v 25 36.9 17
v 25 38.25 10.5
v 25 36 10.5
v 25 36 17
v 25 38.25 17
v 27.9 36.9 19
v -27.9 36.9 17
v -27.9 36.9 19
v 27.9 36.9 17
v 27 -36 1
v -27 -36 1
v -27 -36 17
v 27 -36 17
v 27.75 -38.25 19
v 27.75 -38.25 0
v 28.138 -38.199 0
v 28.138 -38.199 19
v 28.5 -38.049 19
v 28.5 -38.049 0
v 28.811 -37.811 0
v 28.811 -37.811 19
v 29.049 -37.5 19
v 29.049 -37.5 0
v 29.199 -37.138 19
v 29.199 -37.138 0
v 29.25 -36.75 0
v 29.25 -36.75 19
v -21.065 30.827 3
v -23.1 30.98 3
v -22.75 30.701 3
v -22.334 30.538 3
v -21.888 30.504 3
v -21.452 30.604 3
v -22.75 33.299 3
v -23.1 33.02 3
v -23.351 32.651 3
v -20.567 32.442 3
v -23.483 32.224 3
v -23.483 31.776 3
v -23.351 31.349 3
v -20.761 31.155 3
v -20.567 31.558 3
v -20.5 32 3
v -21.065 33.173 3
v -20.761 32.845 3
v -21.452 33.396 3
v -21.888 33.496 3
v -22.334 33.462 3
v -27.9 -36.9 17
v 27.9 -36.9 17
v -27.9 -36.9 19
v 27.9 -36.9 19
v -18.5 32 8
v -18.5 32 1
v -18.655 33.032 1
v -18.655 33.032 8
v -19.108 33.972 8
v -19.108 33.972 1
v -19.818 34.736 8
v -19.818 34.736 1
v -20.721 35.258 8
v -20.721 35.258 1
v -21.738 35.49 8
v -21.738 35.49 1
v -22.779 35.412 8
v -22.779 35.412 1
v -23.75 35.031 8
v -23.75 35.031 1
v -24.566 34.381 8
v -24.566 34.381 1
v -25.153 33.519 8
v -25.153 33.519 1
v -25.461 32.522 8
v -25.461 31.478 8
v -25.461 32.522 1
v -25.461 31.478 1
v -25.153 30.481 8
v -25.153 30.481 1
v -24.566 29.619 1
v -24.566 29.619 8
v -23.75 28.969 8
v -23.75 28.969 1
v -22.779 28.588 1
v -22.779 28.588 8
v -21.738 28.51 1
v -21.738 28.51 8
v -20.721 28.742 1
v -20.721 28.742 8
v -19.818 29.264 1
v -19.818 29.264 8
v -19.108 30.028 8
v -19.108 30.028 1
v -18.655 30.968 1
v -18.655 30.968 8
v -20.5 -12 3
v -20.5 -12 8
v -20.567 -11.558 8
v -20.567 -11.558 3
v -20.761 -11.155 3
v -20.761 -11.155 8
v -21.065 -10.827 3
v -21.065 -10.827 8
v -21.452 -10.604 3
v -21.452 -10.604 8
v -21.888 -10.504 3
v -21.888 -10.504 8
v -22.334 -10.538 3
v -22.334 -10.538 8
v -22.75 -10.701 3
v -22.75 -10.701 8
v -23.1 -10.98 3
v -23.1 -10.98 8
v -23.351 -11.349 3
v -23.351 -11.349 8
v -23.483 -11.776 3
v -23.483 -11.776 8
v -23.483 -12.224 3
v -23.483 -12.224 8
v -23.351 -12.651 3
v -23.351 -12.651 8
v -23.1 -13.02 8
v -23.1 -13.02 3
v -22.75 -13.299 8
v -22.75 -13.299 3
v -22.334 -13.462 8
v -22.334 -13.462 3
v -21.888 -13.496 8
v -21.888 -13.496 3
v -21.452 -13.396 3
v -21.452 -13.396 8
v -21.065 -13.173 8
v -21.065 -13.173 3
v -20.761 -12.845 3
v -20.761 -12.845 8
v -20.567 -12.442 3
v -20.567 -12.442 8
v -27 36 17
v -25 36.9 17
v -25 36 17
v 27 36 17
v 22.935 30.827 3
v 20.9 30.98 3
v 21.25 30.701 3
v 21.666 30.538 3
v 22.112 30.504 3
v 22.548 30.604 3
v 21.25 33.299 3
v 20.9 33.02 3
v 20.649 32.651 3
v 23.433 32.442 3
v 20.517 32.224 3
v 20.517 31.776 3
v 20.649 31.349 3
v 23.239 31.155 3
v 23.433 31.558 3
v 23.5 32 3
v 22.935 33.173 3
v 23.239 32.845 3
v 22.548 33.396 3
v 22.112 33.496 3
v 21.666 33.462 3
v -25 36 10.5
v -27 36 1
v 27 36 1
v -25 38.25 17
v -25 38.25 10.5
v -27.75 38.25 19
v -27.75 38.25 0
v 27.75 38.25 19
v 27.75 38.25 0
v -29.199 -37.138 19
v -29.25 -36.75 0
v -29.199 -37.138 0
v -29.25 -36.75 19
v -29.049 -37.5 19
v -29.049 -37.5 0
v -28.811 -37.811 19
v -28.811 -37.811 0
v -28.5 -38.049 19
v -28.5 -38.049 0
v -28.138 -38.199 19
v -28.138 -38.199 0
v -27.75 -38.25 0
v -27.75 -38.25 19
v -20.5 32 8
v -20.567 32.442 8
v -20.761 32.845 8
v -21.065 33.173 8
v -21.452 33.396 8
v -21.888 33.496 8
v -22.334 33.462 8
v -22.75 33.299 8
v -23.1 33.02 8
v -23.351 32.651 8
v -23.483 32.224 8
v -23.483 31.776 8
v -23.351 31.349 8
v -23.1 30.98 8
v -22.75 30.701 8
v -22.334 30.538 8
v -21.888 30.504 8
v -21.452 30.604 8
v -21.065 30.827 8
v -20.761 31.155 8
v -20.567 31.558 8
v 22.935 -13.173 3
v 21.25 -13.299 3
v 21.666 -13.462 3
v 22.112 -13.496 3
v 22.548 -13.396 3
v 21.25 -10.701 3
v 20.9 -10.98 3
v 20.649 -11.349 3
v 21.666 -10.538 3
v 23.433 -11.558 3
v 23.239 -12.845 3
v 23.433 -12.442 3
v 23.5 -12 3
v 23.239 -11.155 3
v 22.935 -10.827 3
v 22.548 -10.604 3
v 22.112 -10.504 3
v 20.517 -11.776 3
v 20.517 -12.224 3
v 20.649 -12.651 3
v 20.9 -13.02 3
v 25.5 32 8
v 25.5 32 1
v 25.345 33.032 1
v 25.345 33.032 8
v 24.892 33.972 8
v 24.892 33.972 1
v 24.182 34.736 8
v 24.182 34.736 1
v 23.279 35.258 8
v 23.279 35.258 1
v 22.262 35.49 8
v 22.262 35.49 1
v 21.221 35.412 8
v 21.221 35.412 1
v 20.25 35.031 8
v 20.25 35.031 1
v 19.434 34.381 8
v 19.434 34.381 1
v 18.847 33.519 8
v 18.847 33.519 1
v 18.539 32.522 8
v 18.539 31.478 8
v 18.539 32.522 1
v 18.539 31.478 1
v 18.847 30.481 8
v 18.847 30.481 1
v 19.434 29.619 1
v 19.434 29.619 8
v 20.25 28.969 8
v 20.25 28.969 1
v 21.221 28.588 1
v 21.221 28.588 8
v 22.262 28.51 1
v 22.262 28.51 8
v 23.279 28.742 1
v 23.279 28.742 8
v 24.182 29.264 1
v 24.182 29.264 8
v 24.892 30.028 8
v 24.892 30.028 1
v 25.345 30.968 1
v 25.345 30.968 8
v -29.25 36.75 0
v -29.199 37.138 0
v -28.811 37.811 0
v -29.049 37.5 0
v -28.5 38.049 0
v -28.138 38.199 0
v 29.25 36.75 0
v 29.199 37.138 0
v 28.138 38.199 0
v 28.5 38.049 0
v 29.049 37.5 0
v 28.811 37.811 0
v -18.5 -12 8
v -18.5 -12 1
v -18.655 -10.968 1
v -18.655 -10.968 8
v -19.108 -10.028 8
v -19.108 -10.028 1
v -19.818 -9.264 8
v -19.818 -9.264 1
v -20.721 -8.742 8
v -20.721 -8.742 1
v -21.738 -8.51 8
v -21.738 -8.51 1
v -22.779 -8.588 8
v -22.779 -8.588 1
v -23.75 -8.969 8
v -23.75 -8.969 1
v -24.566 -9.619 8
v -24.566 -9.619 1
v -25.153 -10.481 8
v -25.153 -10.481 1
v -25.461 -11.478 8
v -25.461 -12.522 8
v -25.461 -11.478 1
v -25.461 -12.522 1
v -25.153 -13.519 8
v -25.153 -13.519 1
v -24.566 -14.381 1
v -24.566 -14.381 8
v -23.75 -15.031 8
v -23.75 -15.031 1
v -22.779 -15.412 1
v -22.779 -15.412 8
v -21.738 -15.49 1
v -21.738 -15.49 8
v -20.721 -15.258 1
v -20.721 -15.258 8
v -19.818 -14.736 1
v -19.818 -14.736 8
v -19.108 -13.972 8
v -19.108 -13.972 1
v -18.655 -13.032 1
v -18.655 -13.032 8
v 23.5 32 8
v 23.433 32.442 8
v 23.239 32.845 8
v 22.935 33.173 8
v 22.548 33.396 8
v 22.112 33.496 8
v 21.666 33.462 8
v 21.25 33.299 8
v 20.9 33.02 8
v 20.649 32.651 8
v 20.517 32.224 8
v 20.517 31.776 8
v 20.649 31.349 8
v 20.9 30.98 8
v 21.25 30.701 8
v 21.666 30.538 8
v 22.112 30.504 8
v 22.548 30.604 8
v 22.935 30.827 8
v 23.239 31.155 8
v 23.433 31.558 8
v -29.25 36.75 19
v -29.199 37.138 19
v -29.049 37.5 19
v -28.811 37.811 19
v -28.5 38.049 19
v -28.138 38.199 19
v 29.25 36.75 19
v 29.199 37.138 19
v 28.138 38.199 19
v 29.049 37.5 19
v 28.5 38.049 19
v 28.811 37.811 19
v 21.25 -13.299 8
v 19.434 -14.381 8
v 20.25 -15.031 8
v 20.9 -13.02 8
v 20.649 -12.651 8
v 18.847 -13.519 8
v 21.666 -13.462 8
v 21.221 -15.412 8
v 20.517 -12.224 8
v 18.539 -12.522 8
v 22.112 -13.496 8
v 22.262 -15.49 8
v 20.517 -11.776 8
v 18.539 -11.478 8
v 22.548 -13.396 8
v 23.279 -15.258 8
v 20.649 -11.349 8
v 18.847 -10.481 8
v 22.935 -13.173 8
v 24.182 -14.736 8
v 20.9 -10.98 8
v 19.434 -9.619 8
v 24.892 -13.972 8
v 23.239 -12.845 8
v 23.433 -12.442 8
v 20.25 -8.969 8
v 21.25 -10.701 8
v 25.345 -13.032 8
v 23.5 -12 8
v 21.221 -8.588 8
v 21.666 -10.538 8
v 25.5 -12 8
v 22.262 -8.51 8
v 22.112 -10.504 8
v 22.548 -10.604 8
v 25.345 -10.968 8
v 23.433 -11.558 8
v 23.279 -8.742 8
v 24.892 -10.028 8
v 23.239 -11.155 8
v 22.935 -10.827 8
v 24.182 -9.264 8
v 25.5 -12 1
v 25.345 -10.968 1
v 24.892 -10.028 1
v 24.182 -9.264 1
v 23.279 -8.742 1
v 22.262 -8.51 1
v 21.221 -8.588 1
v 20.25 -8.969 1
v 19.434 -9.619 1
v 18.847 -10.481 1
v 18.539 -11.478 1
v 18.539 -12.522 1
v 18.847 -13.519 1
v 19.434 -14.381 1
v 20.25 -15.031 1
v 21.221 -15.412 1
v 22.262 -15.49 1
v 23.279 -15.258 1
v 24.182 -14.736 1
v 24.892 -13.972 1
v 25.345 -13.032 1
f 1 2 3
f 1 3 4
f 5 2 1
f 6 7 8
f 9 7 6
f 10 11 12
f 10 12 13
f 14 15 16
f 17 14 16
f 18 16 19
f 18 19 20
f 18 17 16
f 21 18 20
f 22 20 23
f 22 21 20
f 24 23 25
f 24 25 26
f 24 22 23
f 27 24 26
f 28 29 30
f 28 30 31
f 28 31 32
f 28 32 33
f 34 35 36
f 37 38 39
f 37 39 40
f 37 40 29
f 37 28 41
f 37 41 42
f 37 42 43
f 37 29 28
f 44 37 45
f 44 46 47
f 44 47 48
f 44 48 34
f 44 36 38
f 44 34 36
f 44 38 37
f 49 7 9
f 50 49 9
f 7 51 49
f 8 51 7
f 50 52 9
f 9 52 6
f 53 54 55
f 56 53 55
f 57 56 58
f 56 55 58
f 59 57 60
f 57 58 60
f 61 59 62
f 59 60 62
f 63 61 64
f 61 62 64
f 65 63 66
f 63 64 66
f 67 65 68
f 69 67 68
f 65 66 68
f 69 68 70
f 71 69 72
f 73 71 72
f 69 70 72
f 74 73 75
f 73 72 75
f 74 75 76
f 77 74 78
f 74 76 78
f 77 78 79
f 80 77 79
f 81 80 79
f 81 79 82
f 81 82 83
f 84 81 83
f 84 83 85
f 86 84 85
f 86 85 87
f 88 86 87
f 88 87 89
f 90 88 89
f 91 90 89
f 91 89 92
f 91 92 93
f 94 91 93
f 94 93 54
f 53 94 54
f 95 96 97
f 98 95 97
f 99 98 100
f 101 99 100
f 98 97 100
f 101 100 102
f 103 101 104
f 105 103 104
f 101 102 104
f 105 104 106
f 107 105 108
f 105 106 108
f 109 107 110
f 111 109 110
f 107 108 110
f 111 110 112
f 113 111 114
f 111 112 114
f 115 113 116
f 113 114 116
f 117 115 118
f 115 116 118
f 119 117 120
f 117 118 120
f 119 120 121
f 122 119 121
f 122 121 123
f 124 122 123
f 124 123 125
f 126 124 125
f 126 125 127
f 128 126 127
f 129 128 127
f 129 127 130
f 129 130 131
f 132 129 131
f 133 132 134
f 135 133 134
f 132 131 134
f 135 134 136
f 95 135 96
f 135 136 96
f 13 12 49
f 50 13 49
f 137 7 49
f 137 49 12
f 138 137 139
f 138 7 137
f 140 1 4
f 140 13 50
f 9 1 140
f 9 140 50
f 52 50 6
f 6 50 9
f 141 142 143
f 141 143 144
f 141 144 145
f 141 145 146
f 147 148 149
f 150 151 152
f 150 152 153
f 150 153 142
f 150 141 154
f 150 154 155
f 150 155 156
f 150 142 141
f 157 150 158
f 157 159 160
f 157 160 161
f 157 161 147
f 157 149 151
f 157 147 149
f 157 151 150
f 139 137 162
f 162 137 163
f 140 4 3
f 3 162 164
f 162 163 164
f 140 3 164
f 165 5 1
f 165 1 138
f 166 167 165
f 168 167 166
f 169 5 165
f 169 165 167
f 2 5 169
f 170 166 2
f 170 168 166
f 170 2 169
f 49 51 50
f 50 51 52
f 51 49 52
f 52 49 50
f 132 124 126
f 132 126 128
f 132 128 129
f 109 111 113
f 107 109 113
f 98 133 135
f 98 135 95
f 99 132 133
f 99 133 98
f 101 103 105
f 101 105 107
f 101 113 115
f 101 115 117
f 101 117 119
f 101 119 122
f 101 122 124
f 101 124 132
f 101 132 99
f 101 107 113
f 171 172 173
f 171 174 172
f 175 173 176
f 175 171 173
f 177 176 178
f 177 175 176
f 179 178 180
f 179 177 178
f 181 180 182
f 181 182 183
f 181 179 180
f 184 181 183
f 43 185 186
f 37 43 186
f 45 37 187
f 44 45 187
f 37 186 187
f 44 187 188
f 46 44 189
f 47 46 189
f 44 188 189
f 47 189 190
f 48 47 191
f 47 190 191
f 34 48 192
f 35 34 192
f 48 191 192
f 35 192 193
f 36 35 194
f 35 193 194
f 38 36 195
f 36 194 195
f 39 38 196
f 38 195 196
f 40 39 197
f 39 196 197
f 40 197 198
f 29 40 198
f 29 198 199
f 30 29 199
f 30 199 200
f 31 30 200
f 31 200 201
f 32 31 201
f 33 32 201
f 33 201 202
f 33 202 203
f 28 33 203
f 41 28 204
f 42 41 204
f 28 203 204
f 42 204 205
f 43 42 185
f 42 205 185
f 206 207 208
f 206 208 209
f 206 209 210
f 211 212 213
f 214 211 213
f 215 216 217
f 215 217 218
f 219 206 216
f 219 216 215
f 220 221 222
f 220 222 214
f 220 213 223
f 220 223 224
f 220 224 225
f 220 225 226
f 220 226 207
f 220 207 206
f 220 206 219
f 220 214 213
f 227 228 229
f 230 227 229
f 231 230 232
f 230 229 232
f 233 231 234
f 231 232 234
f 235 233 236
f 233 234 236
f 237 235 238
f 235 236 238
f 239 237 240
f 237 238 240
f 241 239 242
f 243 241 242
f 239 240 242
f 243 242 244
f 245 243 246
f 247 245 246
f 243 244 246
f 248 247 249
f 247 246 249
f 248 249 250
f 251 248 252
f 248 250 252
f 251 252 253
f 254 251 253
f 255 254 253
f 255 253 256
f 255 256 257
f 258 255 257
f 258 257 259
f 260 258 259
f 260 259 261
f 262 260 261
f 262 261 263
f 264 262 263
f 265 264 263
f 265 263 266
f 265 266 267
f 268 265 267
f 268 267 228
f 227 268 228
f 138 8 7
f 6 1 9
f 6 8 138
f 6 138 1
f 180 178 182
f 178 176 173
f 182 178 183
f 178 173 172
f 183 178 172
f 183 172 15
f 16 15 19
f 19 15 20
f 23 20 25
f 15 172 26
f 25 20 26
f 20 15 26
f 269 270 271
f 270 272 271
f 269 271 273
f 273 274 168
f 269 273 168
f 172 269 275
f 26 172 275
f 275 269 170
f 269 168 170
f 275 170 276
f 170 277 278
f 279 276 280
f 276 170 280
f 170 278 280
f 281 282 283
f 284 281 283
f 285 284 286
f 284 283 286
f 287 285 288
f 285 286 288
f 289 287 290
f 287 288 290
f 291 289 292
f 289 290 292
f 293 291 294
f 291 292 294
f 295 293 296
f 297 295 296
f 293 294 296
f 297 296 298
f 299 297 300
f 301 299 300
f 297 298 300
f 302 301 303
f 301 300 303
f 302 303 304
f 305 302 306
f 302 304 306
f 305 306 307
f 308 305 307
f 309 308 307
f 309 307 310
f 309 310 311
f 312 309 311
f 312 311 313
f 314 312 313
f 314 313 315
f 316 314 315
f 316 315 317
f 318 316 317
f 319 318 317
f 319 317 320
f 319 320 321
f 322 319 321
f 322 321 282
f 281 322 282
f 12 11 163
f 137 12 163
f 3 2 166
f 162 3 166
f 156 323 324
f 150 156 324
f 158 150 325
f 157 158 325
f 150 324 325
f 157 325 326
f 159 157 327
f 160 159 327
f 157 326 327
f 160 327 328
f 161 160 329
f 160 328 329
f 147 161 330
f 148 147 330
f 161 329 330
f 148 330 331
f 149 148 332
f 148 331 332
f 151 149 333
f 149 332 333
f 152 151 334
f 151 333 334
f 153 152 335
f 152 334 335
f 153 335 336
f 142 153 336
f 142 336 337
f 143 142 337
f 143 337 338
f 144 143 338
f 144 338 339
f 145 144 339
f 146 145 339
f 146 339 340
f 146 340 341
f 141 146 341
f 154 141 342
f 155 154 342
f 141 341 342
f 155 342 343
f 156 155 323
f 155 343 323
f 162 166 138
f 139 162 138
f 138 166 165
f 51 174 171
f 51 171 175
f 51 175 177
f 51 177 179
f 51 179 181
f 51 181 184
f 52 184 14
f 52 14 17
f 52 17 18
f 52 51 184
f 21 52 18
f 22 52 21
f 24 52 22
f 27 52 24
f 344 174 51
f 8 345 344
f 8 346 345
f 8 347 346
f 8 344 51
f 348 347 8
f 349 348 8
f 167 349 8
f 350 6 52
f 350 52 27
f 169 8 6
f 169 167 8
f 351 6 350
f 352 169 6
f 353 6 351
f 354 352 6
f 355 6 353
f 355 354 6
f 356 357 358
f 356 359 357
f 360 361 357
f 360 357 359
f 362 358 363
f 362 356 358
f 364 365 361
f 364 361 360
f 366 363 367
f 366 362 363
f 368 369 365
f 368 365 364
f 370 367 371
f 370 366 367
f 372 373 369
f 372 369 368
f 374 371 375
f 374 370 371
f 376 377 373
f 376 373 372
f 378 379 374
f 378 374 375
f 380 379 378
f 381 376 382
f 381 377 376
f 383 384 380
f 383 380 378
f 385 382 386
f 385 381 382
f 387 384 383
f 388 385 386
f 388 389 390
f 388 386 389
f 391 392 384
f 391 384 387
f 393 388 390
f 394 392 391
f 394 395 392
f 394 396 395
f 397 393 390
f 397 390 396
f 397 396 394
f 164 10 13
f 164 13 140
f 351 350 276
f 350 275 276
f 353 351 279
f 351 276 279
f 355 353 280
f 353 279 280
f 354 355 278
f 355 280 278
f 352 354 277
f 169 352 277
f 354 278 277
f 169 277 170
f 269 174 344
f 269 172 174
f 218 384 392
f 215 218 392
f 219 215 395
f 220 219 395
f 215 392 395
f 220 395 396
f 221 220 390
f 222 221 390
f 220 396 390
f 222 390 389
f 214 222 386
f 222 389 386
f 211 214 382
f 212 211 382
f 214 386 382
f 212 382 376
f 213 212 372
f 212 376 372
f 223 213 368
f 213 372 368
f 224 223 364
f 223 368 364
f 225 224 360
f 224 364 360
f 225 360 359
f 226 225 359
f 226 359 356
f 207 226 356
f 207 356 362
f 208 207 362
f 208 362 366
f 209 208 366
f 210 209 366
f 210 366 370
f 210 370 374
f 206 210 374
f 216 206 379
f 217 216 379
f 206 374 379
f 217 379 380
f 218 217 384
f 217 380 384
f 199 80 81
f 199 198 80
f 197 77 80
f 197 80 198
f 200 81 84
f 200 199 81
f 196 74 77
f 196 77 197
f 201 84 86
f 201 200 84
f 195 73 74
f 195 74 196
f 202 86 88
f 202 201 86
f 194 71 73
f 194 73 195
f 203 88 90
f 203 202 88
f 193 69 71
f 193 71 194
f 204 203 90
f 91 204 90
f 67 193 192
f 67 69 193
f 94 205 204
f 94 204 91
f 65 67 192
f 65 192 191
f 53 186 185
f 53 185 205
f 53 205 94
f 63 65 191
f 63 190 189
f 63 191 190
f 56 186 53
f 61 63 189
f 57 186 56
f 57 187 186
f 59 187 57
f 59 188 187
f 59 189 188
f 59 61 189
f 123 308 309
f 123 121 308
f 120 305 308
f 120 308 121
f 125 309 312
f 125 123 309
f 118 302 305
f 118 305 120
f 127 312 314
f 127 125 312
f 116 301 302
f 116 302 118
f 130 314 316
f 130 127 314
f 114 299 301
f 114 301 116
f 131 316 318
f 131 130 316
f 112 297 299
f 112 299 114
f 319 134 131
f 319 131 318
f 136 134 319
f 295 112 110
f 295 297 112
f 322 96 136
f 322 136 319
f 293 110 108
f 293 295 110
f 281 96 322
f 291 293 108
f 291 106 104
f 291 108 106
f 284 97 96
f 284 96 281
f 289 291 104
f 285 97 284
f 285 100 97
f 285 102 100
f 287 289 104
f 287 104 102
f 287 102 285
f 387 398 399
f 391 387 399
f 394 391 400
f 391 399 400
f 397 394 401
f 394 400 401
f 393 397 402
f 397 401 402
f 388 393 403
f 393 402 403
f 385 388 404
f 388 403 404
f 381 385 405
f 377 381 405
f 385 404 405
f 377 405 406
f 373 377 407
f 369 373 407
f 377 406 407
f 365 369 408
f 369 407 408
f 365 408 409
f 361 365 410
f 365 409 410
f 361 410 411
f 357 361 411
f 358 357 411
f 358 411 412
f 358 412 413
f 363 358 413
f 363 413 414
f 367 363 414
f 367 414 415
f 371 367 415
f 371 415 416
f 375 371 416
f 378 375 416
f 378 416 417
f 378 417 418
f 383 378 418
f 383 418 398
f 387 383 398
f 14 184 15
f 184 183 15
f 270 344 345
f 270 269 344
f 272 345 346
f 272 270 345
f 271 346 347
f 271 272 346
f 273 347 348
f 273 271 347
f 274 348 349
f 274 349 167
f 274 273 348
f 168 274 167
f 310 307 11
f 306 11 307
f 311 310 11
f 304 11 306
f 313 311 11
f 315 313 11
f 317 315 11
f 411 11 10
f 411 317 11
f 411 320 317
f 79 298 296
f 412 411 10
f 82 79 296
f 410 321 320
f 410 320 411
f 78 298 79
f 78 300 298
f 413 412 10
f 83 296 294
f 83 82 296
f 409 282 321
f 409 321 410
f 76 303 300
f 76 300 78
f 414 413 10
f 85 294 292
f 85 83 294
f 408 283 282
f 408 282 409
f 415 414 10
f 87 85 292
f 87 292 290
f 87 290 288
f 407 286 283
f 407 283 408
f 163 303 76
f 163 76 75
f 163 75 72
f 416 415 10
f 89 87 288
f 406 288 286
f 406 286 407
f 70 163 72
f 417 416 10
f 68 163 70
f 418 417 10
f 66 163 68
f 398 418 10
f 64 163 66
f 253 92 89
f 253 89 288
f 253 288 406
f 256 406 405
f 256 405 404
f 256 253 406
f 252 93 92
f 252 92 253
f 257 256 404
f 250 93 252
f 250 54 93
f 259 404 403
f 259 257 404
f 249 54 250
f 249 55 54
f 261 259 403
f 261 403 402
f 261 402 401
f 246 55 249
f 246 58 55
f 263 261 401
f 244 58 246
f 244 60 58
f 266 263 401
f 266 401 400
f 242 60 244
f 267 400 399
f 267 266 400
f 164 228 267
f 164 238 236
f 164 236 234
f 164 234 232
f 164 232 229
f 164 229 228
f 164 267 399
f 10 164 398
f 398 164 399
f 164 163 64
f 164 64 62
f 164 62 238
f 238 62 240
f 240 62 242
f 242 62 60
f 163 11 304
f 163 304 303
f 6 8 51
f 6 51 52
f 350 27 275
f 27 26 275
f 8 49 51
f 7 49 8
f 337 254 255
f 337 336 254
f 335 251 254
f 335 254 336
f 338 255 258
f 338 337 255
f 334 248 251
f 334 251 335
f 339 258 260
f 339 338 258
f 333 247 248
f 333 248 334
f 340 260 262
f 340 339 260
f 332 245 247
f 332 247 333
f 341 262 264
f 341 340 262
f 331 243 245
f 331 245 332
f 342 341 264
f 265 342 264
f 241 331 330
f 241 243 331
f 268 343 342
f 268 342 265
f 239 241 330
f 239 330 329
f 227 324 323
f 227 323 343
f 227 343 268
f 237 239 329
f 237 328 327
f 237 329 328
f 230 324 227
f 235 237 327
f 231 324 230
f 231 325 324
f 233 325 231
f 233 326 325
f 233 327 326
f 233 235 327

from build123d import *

# Parameters (mm, degrees)
F0_W      = 58.5
F0_H      = 76.5
F0_W_2    = 54
F0_H_2    = 72
F0_R      = 3.5
F1_DEPTH  = 1
F2_DEPTH  = 19
F3_DEPTH  = 8
F4_R      = 1.5
F5_DEPTH  = 5
F6_W      = 55.8
F6_H      = 73.8
F7_DEPTH  = 2
F8_W      = 50
F8_H      = 6.5
F9_DEPTH  = 3
F10_R     = 1.5
F11_W     = 55.8
F11_H     = 73.8
F12_DEPTH = 2


with BuildPart() as f1:
    # F0 (on Top) → F1 (new body)
    with BuildSketch(Plane.XY):
        Rectangle(F0_W, F0_H)
        Rectangle(F0_W_2, F0_H_2, mode=Mode.SUBTRACT)
        Rectangle(F0_W_2, F0_H_2)
        with Locations((-22, -12)):
            Circle(F0_R, mode=Mode.SUBTRACT)
        with Locations((22, -12)):
            Circle(F0_R, mode=Mode.SUBTRACT)
        with Locations((-22, 32)):
            Circle(F0_R, mode=Mode.SUBTRACT)
        with Locations((22, 32)):
            Circle(F0_R, mode=Mode.SUBTRACT)
        with Locations((-22, 32)):
            Circle(F0_R)
        with Locations((22, 32)):
            Circle(F0_R)
        with Locations((22, -12)):
            Circle(F0_R)
        with Locations((-22, -12)):
            Circle(F0_R)
    extrude(amount=F1_DEPTH)

    # F0 (on Top) → F2 (join)
    with BuildSketch(Plane.XY):
        Rectangle(F0_W, F0_H)
        Rectangle(F0_W_2, F0_H_2, mode=Mode.SUBTRACT)
    extrude(amount=F2_DEPTH)

    # F0 (on Top) → F3 (join)
    with BuildSketch(Plane.XY):
        with Locations((-22, -12)):
            Circle(F0_R)
        with Locations((22, -12)):
            Circle(F0_R)
        with Locations((-22, 32)):
            Circle(F0_R)
        with Locations((22, 32)):
            Circle(F0_R)
    extrude(amount=F3_DEPTH)

    # F4 (on face) → F5 (cut)
    with BuildSketch(Plane.XY.offset(8)):
        with Locations((22, -12)):
            Circle(F4_R)
        with Locations((22, 32)):
            Circle(F4_R)
        with Locations((-22, -12)):
            Circle(F4_R)
        with Locations((-22, 32)):
            Circle(F4_R)
    extrude(amount=-F5_DEPTH, mode=Mode.SUBTRACT)

    # F6 (on face) → F7 (cut)
    with BuildSketch(Plane.XY.offset(19)):
        Rectangle(F6_W, F6_H)
    extrude(amount=-F7_DEPTH, mode=Mode.SUBTRACT)

    # F8 (on face) → F9 (cut)
    with BuildSketch(Plane(origin=(0, 38.25, 0), x_dir=(-1, 0, 0), z_dir=(0, 1, 0))):
        with Locations((0, 13.75)):
            Rectangle(F8_W, F8_H)
    extrude(amount=-F9_DEPTH, mode=Mode.SUBTRACT)

    # F10
    f10_edges = [f1.edges().sort_by_distance(p)[0] for p in [
        (29.25, -38.25, 9.5),
        (-29.25, -38.25, 9.5),
        (-29.25, 38.25, 9.5),
        (29.25, 38.25, 9.5),
    ]]
    fillet(f10_edges, radius=F10_R)


with BuildPart() as f12:
    # F11 (on face) → F12 (new body)
    with BuildSketch(Plane.XY.offset(17)):
        Rectangle(F11_W, F11_H)
    extrude(amount=F12_DEPTH)


solid = Compound([f1.part, f12.part])
